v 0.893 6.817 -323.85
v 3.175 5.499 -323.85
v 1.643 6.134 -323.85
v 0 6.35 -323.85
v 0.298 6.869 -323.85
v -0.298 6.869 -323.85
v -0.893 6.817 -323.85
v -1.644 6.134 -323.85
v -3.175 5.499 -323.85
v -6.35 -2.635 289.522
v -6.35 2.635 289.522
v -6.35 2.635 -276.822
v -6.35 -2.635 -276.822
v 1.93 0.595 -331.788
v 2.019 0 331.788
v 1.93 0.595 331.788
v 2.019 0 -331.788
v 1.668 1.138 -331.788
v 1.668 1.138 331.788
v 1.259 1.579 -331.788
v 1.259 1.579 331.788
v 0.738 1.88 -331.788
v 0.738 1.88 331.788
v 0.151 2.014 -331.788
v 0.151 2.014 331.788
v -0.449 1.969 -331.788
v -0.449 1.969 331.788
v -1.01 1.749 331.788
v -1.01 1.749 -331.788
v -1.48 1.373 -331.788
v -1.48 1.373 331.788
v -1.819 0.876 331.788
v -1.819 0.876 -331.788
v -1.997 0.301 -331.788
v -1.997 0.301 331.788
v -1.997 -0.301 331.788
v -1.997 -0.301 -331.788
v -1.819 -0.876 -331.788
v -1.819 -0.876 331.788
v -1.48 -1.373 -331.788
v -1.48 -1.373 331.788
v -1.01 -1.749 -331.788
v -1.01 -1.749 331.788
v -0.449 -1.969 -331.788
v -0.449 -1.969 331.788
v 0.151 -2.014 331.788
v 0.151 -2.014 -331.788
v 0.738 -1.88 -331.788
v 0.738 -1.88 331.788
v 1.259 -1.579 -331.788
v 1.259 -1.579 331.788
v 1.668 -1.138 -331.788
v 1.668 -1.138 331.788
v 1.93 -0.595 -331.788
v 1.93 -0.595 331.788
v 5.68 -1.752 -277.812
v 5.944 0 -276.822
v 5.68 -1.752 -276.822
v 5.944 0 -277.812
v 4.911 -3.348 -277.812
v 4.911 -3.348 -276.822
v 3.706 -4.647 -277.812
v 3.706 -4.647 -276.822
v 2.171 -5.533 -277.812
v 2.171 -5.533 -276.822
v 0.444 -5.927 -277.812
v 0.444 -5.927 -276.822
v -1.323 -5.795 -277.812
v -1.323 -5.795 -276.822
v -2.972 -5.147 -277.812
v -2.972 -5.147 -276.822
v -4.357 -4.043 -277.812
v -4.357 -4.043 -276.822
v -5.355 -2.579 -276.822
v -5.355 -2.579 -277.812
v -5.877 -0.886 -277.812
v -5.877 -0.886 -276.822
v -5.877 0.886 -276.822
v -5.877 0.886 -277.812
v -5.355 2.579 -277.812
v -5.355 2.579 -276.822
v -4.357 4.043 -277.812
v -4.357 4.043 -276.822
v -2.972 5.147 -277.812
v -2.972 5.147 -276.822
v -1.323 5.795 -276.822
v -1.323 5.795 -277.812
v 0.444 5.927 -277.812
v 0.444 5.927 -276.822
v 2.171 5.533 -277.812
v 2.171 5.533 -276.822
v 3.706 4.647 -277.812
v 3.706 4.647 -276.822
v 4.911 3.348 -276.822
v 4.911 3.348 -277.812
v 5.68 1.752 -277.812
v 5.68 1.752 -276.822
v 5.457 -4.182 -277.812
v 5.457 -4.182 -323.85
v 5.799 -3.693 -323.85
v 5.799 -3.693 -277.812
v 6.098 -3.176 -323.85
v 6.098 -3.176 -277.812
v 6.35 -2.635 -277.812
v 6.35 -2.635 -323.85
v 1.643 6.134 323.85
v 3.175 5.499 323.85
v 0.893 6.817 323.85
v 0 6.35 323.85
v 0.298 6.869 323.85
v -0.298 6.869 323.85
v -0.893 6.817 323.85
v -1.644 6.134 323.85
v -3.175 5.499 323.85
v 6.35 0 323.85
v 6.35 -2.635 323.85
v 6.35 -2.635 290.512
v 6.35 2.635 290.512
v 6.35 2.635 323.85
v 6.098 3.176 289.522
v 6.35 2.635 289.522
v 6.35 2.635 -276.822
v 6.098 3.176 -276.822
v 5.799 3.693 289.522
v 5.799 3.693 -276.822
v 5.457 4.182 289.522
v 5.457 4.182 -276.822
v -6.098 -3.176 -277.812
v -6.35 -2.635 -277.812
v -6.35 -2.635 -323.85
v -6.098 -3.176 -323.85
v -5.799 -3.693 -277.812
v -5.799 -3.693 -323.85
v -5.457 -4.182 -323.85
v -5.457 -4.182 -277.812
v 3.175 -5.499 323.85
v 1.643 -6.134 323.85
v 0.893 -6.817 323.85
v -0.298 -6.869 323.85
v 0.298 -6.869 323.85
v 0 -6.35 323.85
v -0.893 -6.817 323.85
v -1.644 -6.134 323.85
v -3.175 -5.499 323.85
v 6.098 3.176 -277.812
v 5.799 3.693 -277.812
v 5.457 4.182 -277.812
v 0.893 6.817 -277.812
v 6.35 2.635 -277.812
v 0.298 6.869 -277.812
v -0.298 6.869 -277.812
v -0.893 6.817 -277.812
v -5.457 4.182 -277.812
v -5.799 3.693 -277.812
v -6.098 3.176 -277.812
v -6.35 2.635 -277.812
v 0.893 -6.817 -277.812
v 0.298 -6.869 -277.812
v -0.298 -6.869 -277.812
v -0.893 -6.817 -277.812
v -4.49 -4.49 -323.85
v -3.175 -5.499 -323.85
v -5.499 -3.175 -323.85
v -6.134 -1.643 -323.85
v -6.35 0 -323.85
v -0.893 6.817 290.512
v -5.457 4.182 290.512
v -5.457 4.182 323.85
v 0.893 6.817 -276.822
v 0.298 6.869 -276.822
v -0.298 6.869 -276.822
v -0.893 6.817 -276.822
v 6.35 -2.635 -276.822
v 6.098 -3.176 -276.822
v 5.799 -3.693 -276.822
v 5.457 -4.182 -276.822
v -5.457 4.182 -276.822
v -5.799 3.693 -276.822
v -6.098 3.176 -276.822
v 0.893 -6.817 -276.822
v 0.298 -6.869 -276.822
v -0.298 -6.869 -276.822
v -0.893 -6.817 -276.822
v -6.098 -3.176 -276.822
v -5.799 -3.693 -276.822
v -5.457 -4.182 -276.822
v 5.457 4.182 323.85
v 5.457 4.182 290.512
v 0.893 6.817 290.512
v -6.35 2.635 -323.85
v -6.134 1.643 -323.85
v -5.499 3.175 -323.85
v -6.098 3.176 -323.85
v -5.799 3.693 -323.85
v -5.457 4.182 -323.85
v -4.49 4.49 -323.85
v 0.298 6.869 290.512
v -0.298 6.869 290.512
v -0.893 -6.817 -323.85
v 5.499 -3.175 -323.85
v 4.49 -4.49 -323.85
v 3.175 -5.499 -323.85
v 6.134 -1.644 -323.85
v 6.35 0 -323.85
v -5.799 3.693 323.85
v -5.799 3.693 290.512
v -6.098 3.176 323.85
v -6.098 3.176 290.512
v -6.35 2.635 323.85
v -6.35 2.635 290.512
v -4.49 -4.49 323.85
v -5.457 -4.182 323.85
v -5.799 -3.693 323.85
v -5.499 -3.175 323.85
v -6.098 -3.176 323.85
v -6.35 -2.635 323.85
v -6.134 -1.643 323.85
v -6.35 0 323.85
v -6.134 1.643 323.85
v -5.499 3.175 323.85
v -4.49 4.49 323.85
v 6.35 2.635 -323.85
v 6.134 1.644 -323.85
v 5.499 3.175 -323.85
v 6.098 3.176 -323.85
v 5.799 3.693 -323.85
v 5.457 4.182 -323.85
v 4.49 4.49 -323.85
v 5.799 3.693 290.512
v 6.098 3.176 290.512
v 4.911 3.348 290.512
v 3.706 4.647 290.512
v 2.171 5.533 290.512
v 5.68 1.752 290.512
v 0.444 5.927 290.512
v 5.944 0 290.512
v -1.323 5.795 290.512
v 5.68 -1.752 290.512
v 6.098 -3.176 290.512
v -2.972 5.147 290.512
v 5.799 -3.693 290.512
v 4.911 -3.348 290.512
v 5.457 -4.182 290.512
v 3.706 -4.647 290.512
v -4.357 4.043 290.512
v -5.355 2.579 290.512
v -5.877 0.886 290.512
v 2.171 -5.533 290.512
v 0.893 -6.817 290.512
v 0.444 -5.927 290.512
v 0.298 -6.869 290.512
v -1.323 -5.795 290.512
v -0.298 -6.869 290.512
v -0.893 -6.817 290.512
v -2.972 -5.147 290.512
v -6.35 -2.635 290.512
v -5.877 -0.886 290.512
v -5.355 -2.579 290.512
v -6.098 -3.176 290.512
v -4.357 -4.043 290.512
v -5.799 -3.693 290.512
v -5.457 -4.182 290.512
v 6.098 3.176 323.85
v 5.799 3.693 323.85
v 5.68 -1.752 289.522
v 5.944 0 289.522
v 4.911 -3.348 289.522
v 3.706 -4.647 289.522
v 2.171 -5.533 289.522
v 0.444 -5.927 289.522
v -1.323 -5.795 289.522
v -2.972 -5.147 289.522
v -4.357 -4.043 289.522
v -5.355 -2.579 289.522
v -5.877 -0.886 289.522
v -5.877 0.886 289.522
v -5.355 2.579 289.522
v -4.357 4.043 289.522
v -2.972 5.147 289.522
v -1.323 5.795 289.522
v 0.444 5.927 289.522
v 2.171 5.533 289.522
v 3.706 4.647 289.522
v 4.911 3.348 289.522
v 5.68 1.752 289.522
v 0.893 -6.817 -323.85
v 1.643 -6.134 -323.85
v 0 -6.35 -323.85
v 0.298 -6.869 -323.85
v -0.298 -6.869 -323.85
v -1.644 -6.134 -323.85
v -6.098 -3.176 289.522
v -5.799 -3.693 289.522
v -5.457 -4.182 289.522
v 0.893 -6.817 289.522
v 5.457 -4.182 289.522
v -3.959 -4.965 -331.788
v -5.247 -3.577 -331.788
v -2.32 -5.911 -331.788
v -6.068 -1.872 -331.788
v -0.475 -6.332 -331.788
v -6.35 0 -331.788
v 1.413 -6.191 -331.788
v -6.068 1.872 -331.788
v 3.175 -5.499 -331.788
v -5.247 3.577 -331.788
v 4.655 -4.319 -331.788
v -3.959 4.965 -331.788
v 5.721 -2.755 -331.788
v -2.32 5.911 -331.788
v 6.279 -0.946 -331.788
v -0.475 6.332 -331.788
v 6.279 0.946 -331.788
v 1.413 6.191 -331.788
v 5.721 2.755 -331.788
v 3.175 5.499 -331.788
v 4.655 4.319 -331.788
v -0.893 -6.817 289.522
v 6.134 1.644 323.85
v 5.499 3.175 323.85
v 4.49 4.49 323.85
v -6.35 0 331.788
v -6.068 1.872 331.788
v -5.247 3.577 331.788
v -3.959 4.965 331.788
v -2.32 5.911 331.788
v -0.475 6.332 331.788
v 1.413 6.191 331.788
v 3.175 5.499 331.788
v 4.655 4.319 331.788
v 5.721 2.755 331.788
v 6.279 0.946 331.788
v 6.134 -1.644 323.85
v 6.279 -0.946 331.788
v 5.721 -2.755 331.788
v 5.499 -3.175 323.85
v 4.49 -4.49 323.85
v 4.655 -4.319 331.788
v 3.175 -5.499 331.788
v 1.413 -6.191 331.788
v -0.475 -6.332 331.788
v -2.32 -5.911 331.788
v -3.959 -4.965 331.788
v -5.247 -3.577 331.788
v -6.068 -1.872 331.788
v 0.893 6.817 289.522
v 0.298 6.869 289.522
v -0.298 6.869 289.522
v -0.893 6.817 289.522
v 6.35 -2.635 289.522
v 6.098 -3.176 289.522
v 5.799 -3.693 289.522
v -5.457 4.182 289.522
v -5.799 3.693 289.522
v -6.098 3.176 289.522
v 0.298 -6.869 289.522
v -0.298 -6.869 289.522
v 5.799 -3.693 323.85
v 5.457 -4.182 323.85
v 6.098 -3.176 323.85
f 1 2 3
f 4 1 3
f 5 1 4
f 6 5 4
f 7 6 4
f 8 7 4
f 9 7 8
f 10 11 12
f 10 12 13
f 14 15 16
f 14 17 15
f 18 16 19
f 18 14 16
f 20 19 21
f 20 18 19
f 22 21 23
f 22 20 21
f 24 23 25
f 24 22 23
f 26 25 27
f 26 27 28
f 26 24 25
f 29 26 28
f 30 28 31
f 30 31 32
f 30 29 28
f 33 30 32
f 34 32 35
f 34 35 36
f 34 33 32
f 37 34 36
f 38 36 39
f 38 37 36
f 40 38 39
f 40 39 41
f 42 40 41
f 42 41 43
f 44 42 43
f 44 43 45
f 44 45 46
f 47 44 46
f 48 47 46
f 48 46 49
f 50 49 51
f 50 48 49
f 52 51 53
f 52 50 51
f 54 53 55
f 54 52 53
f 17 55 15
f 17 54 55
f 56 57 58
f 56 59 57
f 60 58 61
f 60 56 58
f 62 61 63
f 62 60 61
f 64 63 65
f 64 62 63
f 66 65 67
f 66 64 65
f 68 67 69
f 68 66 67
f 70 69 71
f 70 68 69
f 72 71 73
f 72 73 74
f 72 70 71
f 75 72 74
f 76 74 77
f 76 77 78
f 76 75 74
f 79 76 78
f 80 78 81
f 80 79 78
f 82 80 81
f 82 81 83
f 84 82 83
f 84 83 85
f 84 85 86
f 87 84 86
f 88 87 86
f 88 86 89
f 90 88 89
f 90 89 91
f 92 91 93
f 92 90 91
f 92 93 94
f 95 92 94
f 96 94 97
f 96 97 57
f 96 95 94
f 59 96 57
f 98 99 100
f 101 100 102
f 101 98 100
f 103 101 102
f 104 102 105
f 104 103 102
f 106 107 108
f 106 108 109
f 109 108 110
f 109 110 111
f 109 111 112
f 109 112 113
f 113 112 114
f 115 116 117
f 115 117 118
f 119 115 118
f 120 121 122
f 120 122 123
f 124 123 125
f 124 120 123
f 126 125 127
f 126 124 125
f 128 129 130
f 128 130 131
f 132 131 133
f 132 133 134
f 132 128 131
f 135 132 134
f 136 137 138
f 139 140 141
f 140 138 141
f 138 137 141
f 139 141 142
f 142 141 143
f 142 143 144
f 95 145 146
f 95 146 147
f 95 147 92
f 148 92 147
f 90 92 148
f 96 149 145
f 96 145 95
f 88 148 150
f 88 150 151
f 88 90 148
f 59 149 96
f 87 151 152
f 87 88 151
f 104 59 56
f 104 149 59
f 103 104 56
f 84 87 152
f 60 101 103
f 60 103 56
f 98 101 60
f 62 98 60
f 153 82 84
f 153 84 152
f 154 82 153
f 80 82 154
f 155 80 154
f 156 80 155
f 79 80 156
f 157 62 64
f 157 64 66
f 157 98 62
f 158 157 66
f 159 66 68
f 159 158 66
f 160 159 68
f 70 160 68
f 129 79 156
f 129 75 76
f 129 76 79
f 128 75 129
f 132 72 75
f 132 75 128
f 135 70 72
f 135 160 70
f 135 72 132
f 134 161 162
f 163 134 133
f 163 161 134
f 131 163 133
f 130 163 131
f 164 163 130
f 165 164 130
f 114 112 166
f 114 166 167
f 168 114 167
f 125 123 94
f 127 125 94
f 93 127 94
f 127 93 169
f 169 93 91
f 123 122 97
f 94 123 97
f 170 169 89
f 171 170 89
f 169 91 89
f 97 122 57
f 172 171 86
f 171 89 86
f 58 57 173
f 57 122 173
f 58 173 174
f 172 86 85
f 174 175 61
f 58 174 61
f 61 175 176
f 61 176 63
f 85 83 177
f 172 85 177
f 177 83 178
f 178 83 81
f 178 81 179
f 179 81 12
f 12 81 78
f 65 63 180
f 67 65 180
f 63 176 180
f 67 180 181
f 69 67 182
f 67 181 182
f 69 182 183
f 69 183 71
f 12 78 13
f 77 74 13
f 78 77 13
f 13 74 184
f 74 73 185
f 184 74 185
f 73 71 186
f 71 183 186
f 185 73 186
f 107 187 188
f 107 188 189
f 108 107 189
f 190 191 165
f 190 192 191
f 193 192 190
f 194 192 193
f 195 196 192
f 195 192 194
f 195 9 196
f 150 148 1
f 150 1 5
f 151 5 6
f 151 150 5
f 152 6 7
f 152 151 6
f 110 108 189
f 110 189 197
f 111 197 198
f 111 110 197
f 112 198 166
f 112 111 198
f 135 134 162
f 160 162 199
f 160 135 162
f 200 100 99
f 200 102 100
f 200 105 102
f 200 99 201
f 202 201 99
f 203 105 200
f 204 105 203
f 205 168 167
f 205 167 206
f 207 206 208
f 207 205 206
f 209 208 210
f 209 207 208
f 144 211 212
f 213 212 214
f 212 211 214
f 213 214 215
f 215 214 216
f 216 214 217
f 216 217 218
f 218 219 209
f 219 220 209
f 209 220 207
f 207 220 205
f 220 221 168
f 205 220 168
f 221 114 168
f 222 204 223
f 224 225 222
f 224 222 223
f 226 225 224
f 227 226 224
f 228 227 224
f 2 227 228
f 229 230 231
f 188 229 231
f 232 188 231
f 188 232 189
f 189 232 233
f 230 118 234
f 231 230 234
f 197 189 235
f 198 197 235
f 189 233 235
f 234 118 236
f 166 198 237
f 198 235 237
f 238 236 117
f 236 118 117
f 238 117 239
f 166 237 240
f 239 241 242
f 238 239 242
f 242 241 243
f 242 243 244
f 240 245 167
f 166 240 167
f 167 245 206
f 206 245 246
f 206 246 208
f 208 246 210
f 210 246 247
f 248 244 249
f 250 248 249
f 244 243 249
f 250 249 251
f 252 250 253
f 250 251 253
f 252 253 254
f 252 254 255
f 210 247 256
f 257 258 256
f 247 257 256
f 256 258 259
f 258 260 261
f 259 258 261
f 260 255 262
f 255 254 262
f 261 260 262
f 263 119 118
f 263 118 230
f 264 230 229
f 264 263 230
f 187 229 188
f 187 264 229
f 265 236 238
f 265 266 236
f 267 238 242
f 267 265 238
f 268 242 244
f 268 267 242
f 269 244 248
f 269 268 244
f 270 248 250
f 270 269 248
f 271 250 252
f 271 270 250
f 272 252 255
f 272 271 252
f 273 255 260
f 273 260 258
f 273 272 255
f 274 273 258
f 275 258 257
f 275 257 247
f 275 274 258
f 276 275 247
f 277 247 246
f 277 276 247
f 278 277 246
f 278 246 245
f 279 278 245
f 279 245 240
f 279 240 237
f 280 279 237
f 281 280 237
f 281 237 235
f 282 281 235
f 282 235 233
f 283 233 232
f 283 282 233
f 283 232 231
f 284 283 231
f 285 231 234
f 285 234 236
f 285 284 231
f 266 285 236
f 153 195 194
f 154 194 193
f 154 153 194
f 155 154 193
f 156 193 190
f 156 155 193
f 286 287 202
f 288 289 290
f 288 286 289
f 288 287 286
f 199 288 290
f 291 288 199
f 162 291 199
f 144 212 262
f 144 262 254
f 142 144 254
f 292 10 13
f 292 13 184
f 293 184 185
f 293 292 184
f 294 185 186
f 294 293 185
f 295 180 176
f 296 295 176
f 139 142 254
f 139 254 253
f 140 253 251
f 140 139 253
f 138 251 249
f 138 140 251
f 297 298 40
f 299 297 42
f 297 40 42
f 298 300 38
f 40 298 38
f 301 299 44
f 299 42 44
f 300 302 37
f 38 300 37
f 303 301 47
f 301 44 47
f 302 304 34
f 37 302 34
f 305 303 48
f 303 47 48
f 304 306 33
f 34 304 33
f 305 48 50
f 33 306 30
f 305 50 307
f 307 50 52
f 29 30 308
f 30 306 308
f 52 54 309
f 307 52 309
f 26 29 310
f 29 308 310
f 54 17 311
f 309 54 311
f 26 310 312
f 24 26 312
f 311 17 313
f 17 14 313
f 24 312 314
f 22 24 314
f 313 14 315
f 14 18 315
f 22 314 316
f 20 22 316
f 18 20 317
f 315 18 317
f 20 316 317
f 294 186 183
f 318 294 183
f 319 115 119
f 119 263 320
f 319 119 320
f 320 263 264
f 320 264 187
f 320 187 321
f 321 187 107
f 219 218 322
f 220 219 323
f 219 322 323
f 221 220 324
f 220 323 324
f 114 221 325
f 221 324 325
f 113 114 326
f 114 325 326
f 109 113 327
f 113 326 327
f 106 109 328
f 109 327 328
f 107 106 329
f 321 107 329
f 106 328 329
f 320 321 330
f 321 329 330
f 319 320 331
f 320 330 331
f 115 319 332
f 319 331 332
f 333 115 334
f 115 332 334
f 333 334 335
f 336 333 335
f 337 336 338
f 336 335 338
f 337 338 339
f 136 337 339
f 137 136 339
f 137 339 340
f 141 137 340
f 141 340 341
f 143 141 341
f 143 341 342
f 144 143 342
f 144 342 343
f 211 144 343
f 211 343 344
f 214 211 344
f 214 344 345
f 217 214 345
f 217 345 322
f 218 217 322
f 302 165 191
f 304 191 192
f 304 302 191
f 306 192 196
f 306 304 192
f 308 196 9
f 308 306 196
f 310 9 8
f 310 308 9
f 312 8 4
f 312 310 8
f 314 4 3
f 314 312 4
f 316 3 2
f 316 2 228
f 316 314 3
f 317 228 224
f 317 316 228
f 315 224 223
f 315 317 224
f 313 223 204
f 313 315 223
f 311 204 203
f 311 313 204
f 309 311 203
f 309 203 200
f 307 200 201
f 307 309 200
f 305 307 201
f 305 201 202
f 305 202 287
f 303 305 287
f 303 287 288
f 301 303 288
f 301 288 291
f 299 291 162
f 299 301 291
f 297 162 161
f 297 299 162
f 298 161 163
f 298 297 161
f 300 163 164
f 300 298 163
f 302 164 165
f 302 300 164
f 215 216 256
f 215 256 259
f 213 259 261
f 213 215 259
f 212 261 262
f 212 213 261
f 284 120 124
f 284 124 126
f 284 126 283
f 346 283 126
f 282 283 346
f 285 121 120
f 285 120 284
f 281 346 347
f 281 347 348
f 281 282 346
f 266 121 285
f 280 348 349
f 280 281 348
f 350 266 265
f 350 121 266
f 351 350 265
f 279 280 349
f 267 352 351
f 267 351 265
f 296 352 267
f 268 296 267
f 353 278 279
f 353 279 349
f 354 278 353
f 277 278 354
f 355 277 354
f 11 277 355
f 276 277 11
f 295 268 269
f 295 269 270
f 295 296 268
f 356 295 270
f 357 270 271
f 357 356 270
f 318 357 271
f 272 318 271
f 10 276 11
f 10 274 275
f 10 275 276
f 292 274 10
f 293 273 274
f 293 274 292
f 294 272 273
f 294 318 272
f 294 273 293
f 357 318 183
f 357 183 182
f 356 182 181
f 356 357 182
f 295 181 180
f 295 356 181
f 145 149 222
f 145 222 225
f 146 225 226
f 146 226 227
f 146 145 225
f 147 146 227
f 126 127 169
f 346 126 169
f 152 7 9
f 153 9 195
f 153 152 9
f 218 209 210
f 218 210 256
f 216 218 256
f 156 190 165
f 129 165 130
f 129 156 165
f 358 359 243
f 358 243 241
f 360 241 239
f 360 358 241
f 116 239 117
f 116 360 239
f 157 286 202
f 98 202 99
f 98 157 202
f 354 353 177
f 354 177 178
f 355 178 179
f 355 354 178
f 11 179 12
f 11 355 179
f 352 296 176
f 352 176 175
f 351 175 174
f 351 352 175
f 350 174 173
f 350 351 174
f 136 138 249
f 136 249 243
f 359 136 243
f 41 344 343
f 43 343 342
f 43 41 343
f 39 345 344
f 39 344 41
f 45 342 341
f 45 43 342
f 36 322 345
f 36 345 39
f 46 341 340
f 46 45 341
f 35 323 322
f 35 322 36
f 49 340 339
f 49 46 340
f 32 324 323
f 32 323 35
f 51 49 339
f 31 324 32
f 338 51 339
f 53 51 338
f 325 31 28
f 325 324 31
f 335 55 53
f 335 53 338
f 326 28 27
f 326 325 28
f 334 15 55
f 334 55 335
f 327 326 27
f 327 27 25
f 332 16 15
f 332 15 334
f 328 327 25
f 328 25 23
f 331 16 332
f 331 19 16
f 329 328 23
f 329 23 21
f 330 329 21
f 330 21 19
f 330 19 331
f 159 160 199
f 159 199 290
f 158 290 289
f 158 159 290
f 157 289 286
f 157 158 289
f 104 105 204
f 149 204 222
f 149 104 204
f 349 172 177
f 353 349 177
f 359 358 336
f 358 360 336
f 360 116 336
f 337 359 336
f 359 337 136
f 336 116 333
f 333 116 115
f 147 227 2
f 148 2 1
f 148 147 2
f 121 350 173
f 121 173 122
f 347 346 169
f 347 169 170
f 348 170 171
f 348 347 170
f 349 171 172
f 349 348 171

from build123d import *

# Parameters (mm, degrees)
SKETCH1_R                            = 2.0193
BOSS_EXTRUDE1_DEPTH                  = 331.7875
SKETCH2_R                            = 8.89
SKETCH2_R_2                          = 6.35
CUT_EXTRUDE_THIN1_DEPTH              = 7.9375
SKETCH3_W                            = 2.21098701
SKETCH3_H                            = 0.9906
SKETCH3_W_2                          = 2.67360648
F_10_32_TAPPED_HOLE1_D               = 4.0386
F_10_32_TAPPED_HOLE1_DEPTH           = 12.02944
F_10_32_TAPPED_HOLE1_TIP             = 1.213317848
F_10_32_TAPPED_HOLE1_ON_FACE_2_D     = 4.0386
F_10_32_TAPPED_HOLE1_ON_FACE_2_DEPTH = 12.02944
F_10_32_TAPPED_HOLE1_ON_FACE_2_TIP   = 1.213317848


with BuildPart() as part:
    # Sketch1 → Boss-Extrude1 (new, symmetric)
    with BuildSketch(Plane.XY):
        with BuildLine():
            ThreePointArc((0.893039571, 6.816751782), (0, 6.874999966), (-0.893039571, 6.816751782))
            Line((-0.893039571, 6.816751782), (-5.456960429, 4.181770846))
            ThreePointArc((-5.456960429, 4.181770846), (-5.953924622, 3.437499983), (-6.35, 2.634980936))
            Line((-6.35, 2.634980936), (-6.35, -2.634980936))
            ThreePointArc((-6.35, -2.634980936), (-5.953924622, -3.437499983), (-5.456960429, -4.181770846))
            Line((-5.456960429, -4.181770846), (-0.893039571, -6.816751782))
            ThreePointArc((-0.893039571, -6.816751782), (0, -6.874999966), (0.893039571, -6.816751782))
            Line((0.893039571, -6.816751782), (5.456960429, -4.181770846))
            ThreePointArc((5.456960429, -4.181770846), (5.953924622, -3.437499983), (6.35, -2.634980936))
            Line((6.35, -2.634980936), (6.35, 2.634980936))
            ThreePointArc((6.35, 2.634980936), (5.953924622, 3.437499983), (5.456960429, 4.181770846))
            Line((5.456960429, 4.181770846), (0.893039571, 6.816751782))
        make_face()
        Circle(SKETCH1_R, mode=Mode.SUBTRACT)
    extrude(amount=BOSS_EXTRUDE1_DEPTH, both=True)

    # Sketch2 → Cut-Extrude-Thin1 (cut)
    with BuildSketch(Plane(origin=(0, 0, -331.7875), x_dir=(-1, 0, 0), z_dir=(0, 0, -1))):
        Circle(SKETCH2_R)
        Circle(SKETCH2_R_2, mode=Mode.SUBTRACT)
    cut_extrude_thin1 = extrude(amount=-CUT_EXTRUDE_THIN1_DEPTH, mode=Mode.SUBTRACT)

    # Sketch3 → Cut-Revolve4 (revolve, cut)
    with BuildSketch(Plane(origin=(0, 0, 0), x_dir=(1, 0, 0), z_dir=(0, 1, 0))):
        with Locations((7.049093505, -290.0172)):
            Rectangle(SKETCH3_W, SKETCH3_H)
        with Locations((7.28040324, 277.3172)):
            Rectangle(SKETCH3_W_2, SKETCH3_H)
    revolve(axis=Axis((0, 0, -323.85), (0, 0, -1)), mode=Mode.SUBTRACT)

    # Mirror1: Cut-Extrude-Thin1 across plane
    add(cut_extrude_thin1.mirror(Plane.XY), mode=Mode.SUBTRACT)

    # #10-32 Tapped Hole1
    with Locations(Plane(origin=(0, 0, -331.7875), x_dir=(-1, 0, 0), z_dir=(0, 0, -1))):
        with Locations((0, 0)):
            Hole(F_10_32_TAPPED_HOLE1_D / 2, depth=F_10_32_TAPPED_HOLE1_DEPTH)
            with Locations((0, 0, -(F_10_32_TAPPED_HOLE1_DEPTH + F_10_32_TAPPED_HOLE1_TIP / 2))):  # 118° drill point
                Cone(0, F_10_32_TAPPED_HOLE1_D / 2, F_10_32_TAPPED_HOLE1_TIP, mode=Mode.SUBTRACT)

    # #10-32 Tapped Hole1 on face 2
    with Locations(Plane(origin=(0, 0, 331.7875), x_dir=(-1, 0, 0), z_dir=(0, 0, -1))):
        with Locations((0, 0)):
            Hole(F_10_32_TAPPED_HOLE1_ON_FACE_2_D / 2, depth=F_10_32_TAPPED_HOLE1_ON_FACE_2_DEPTH)
            with Locations((0, 0, -(F_10_32_TAPPED_HOLE1_ON_FACE_2_DEPTH + F_10_32_TAPPED_HOLE1_ON_FACE_2_TIP / 2))):  # 118° drill point
                Cone(0, F_10_32_TAPPED_HOLE1_ON_FACE_2_D / 2, F_10_32_TAPPED_HOLE1_ON_FACE_2_TIP, mode=Mode.SUBTRACT)


solid = part.part
